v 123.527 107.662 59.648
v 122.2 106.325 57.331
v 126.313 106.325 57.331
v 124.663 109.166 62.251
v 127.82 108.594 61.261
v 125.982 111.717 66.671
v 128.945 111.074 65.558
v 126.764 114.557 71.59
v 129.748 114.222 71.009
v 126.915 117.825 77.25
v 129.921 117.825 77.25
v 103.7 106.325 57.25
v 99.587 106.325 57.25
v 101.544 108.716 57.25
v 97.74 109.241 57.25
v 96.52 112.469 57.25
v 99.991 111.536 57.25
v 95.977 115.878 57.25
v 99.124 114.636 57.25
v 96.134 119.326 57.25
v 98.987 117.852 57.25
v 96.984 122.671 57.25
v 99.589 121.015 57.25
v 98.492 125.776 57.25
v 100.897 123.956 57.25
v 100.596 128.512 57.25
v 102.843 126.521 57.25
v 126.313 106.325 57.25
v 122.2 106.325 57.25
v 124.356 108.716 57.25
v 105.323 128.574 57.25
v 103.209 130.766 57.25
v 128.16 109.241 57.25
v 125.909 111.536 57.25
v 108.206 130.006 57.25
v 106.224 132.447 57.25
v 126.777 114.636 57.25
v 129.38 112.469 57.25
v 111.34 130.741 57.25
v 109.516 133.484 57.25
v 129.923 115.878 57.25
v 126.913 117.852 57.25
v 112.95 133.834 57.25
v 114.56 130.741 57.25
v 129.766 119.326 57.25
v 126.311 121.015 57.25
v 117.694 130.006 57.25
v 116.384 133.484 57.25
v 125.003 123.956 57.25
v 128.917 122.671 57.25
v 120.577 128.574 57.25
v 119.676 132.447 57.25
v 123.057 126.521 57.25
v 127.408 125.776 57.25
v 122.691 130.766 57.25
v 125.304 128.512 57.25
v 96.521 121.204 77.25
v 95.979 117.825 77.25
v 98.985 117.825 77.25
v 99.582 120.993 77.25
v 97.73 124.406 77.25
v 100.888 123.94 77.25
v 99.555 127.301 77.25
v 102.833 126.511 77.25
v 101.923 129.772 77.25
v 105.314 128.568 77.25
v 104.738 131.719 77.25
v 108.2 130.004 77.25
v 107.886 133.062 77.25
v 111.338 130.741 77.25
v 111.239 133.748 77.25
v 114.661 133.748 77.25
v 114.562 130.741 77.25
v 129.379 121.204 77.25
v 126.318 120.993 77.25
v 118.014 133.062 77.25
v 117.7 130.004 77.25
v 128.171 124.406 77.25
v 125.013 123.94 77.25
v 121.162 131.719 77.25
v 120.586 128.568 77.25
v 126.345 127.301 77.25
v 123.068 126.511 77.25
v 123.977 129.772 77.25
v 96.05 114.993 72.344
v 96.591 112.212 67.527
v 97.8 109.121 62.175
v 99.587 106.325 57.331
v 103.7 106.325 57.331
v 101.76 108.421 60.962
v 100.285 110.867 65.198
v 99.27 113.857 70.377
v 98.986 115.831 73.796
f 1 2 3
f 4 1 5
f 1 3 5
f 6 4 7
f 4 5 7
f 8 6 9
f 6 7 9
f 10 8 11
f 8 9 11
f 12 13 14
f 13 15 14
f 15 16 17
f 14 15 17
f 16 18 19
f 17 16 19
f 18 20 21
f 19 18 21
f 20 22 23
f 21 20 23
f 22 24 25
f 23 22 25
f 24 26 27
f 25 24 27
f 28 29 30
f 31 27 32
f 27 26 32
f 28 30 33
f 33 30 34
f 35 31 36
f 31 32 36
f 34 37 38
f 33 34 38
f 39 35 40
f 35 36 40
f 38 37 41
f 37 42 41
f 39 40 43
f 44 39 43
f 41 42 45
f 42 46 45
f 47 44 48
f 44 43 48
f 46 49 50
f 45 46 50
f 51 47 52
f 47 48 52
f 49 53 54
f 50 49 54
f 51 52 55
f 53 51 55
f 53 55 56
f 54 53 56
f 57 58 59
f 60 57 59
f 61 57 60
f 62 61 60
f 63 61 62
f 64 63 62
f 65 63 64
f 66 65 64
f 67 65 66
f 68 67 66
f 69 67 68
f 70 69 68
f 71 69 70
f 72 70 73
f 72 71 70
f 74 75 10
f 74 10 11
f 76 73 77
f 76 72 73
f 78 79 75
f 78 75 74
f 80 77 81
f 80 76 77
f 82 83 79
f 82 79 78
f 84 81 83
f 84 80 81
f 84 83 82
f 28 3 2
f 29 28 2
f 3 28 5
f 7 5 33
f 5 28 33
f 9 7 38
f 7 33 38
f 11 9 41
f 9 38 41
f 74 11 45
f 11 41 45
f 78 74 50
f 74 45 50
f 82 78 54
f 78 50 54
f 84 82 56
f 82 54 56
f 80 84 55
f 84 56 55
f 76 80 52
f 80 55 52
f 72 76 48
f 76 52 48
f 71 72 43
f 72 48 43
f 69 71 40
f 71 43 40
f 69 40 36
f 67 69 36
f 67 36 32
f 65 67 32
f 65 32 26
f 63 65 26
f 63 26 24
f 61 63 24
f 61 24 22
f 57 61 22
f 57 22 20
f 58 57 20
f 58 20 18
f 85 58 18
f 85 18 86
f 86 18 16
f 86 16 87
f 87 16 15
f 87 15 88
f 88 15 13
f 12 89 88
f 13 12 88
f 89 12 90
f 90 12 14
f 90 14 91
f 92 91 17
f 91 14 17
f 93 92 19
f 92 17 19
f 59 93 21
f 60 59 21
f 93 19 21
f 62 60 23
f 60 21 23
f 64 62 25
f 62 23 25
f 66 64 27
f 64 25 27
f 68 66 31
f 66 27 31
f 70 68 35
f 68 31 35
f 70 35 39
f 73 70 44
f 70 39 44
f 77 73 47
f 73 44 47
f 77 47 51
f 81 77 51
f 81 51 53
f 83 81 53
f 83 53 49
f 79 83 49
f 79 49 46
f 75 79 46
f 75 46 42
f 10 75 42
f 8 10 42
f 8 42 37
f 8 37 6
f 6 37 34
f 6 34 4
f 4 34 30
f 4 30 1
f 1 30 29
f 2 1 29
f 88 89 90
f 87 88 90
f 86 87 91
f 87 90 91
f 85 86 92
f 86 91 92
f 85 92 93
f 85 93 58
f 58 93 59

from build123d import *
from OCP.BRepAlgoAPI import BRepAlgoAPI_Cut
from OCP.TopTools import TopTools_ListOfShape

# Parameters (mm, degrees)
BOSS_EXTRUDE1_DEPTH              = 5
SKETCH2_R                        = 2.5
BOSS_EXTRUDE2_DEPTH              = 100
SKETCH3_W                        = 5
SKETCH3_H                        = 5
BOSS_EXTRUDE3_DEPTH              = 10
SKETCH5_W                        = 5
SKETCH5_H                        = 4.330127019
BOSS_EXTRUDE4_DEPTH              = 117
SKETCH6_W                        = 5
SKETCH6_H                        = 5
BOSS_EXTRUDE5_DEPTH              = 20
BOSS_EXTRUDE6_DEPTH              = 15
SKETCH9_W                        = 5
SKETCH9_H                        = 5
BOSS_EXTRUDE7_DEPTH              = 10
SKETCH10_W                       = 5
SKETCH10_H                       = 5
BOSS_EXTRUDE8_DEPTH              = 99.159909
SKETCH11_W                       = 10
SKETCH11_H                       = 3
BOSS_EXTRUDE9_DEPTH              = 10
CUT_EXTRUDE1_DEPTH               = 187.084790711
CUT_EXTRUDE1_DEPTH_BACK          = 187.084790711
SKETCH13_R                       = 2
SKETCH14_W                       = 10
SKETCH14_H                       = 3
BOSS_EXTRUDE10_DEPTH             = 20
CUT_EXTRUDE2_DEPTH               = 194.255140511
CUT_EXTRUDE2_DEPTH_BACK          = 194.255140511
SKETCH15_R                       = 2
BOSS_EXTRUDE11_DEPTH             = 7.8
CUT_EXTRUDE3_DEPTH               = 187.016127587
CUT_EXTRUDE3_DEPTH_BACK          = 187.016127587
SKETCH17_W                       = 22.17902444
SKETCH17_H                       = 20
BOSS_EXTRUDE12_DEPTH             = 5.75
BOSS_EXTRUDE12_DEPTH_BACK        = 5
SKETCH19_W                       = 1.5
SKETCH19_H                       = 10.75
BOSS_EXTRUDE13_DEPTH             = 2.742414
SKETCH21_W                       = 1.5
SKETCH21_H                       = 1
BOSS_EXTRUDE15_DEPTH             = 1
BOSS_EXTRUDE17_REACH             = 195.512
CUT_EXTRUDE4_START               = 2
SKETCH23_W                       = 7.8
SKETCH23_H                       = 12
CUT_EXTRUDE4_DEPTH               = 10
BOSS_EXTRUDE19_DEPTH             = 5
BOSS_EXTRUDE19_DEPTH_BACK        = 2.165064
SKETCH23_2_W                     = 7.8
SKETCH23_2_H                     = 12
CUT_EXTRUDE5_DEPTH               = 1.25
BOSS_EXTRUDE20_REACH             = 188.016
SKETCH25_W                       = 5
SKETCH25_H                       = 4.330127019
SKETCH26_W                       = 5
SKETCH26_H                       = 2.16506351
CUT_EXTRUDE6_DEPTH               = 5
SKETCH27_W                       = 5.75
SKETCH27_H                       = 7.16506351
BOSS_EXTRUDE21_DEPTH             = 5
SKETCH29_W                       = 3
SKETCH29_H                       = 30
BOSS_EXTRUDE22_DEPTH             = 55
SKETCH30_W                       = 5
SKETCH30_H                       = 3
BOSS_EXTRUDE23_DEPTH             = 5
SKETCH31_W                       = 5
SKETCH31_H                       = 5
BOSS_EXTRUDE24_DEPTH             = 33.5
SKETCH32_W                       = 2
SKETCH32_H                       = 19
BOSS_EXTRUDE25_DEPTH             = 12
SKETCH34_W                       = 41
SKETCH34_H                       = 3
CUT_EXTRUDE7_DEPTH               = 30
SKETCH35_W                       = 14
SKETCH35_H                       = 12
BOSS_EXTRUDE26_DEPTH             = 7
BOSS_EXTRUDE27_REACH             = 187.154
SKETCH36_W                       = 9
SKETCH36_H                       = 5
BOSS_EXTRUDE27_DIRECTION_2_REACH = 187.154
SKETCH37_W                       = 41.5
SKETCH37_H                       = 5
BOSS_EXTRUDE28_DEPTH             = 41
SKETCH38_W                       = 34.251665069
SKETCH38_H                       = 27.087918127
CUT_EXTRUDE8_DEPTH               = 185.330721404
SKETCH39_W                       = 67.684653824
SKETCH39_H                       = 30.030202731
CUT_EXTRUDE9_DEPTH               = 190.235302527
SKETCH44_W                       = 5
SKETCH44_H                       = 7.16506351
BOSS_EXTRUDE30_DEPTH             = 18.612596
BOSS_EXTRUDE31_DEPTH             = 20
BOSS_EXTRUDE32_DEPTH             = 15
SKETCH46_W                       = 5
SKETCH46_H                       = 5
EDIT_THIS_LENGTH_DEPTH           = 50
SKETCH47_W                       = 5
SKETCH47_H                       = 3
BOSS_EXTRUDE34_DEPTH             = 5
CUT_EXTRUDE11_DEPTH              = 203.657530065
CUT_EXTRUDE11_DEPTH_BACK         = 203.657530065
SKETCH53_W                       = 268.348847746
SKETCH53_H                       = 124.858242806


with BuildPart() as part:
    # Sketch1 → Boss-Extrude1 (new body)
    with BuildSketch(Plane(origin=(0, 0, 0), x_dir=(1, 0, 0), z_dir=(0, 1, 0))):
        Polygon((121, 0), (0, 0), (0, -68), (5, -68), (5, -5), (116, -5), (116, -68), (121, -68), align=None)
    extrude(amount=BOSS_EXTRUDE1_DEPTH)

    # Sketch2 → Boss-Extrude2 (add)
    with BuildSketch(Plane(origin=(0, 3.75, 2.165063509), x_dir=(1, 0, 0), z_dir=(0, 0.866025403784438, 0.500000000000001))):
        with Locations(Location((118.200131686, -0.299868314, 0), (0, 0, 90))):
            Circle(SKETCH2_R)
    extrude(amount=BOSS_EXTRUDE2_DEPTH)

    # Sketch3 → Boss-Extrude3 (add)
    with BuildSketch(Plane(origin=(121, 0, 0), x_dir=(0, 0, -1), z_dir=(1, 0, 0))):
        with Locations((-2.5, 2.5)):
            Rectangle(SKETCH3_W, SKETCH3_H)
    extrude(amount=BOSS_EXTRUDE3_DEPTH)

    # Sketch5 → Boss-Extrude4 (add)
    with BuildSketch(Plane(origin=(0, 3.75, 2.165063509), x_dir=(1, 0, 0), z_dir=(0, 0.866025403784438, 0.500000000000001))):
        with Locations((128.5, 0.33493649)):
            Rectangle(SKETCH5_W, SKETCH5_H)
    extrude(amount=BOSS_EXTRUDE4_DEPTH)

    # Sketch6 → Boss-Extrude5 (add)
    with BuildSketch(Plane(origin=(0, 1.25, -2.165063509), x_dir=(-1, 0, 0), z_dir=(0, 0.5000000000000009, -0.866025403784438))):
        with Locations((-128.5, 118.830127019)):
            Rectangle(SKETCH6_W, SKETCH6_H)
    extrude(amount=BOSS_EXTRUDE5_DEPTH)

    # Sketch7 → Boss-Extrude6 (add)
    with BuildSketch(Plane.ZY.offset(-126)):
        Polygon((45.509618943, 113.824972243), (41.179491924, 116.324972243), (38.679491924, 111.994845224), (43.009618943, 109.494845224), align=None)
    extrude(amount=BOSS_EXTRUDE6_DEPTH)

    # Sketch9 → Boss-Extrude7 (add)
    with BuildSketch(Plane(origin=(121, 0, 0), x_dir=(0, 0, -1), z_dir=(1, 0, 0))):
        with Locations((-59.75, 2.5)):
            Rectangle(SKETCH9_W, SKETCH9_H)
    extrude(amount=BOSS_EXTRUDE7_DEPTH)

    # Sketch10 → Boss-Extrude8 (add)
    with BuildSketch(Plane(origin=(0, 5, 0), x_dir=(1, 0, 0), z_dir=(0, 1, 0))):
        with Locations((128.5, -59.75)):
            Rectangle(SKETCH10_W, SKETCH10_H)
    extrude(amount=BOSS_EXTRUDE8_DEPTH)

    # Sketch11 → Boss-Extrude9 (add)
    with BuildSketch(Plane.ZY):
        with Locations((57.25, 1.5)):
            Rectangle(SKETCH11_W, SKETCH11_H)
        with Locations((5, 1.5)):
            Rectangle(SKETCH11_W, SKETCH11_H)
    extrude(amount=BOSS_EXTRUDE9_DEPTH)

    # Sketch13 → Cut-Extrude1 (cut, two sides: drawn at the far end of the back side and taken through both)
    with BuildSketch(Plane(origin=(0, 3, 0), x_dir=(1, 0, 0), z_dir=(0, 1, 0)).offset(-CUT_EXTRUDE1_DEPTH_BACK)):
        with Locations(Location((-5, -5, 0), (0, 0, 270))):
            Circle(SKETCH13_R)
        with Locations(Location((-5, -57.25, 0), (0, 0, 270))):
            Circle(SKETCH13_R)
    extrude(amount=CUT_EXTRUDE1_DEPTH + CUT_EXTRUDE1_DEPTH_BACK, mode=Mode.SUBTRACT)

    # Sketch14 → Boss-Extrude10 (add)
    with BuildSketch(Plane(origin=(121, 0, 0), x_dir=(0, 0, -1), z_dir=(1, 0, 0))):
        with Locations((-15, 1.5)):
            Rectangle(SKETCH14_W, SKETCH14_H)
        with Locations((-47.25, 1.5)):
            Rectangle(SKETCH14_W, SKETCH14_H)
    extrude(amount=BOSS_EXTRUDE10_DEPTH)

    # Sketch15 → Cut-Extrude2 (cut, two sides: drawn at the far end of the back side and taken through both)
    with BuildSketch(Plane(origin=(0, 3, 0), x_dir=(1, 0, 0), z_dir=(0, 1, 0)).offset(-CUT_EXTRUDE2_DEPTH_BACK)):
        with Locations(Location((136, -15, 0), (0, 0, 270))):
            Circle(SKETCH15_R)
        with Locations(Location((136, -47.25, 0), (0, 0, 270))):
            Circle(SKETCH15_R)
    extrude(amount=CUT_EXTRUDE2_DEPTH + CUT_EXTRUDE2_DEPTH_BACK, mode=Mode.SUBTRACT)

    # Sketch16 → Boss-Extrude11 (add)
    with BuildSketch(Plane.ZY.offset(-126)):
        Polygon((49.839745962, 111.324972243), (67, 101.417494955), (64.5, 97.087367936), (47.339745962, 106.994845224), align=None)
    extrude(amount=BOSS_EXTRUDE11_DEPTH)

    # Sketch17 → Cut-Extrude3 (cut, two sides: drawn at the far end of the back side and taken through both)
    with BuildSketch(Plane(origin=(0, 105.074972243, 60.665063509), x_dir=(1, 0, 0), z_dir=(0, 0.8660254037844382, 0.500000000000001)).offset(-CUT_EXTRUDE3_DEPTH_BACK)):
        with Locations((119.91048778, 12.5)):
            Rectangle(SKETCH17_W, SKETCH17_H)
    extrude(amount=CUT_EXTRUDE3_DEPTH + CUT_EXTRUDE3_DEPTH_BACK, mode=Mode.SUBTRACT)



with BuildPart() as body_2:
    # Sketch18 → Boss-Extrude12 (new, two sides: drawn at the far end of the back side and taken through both)
    with BuildSketch(Plane.XY.offset(62.25).offset(-BOSS_EXTRUDE12_DEPTH_BACK)):
        with BuildLine():
            Line((118.2, 104.159908733), (119.7, 104.159908733))
            ThreePointArc((119.7, 104.159908733), (110.2, 113.659908733), (100.7, 104.159908733))
            Line((100.7, 104.159908733), (102.2, 104.159908733))
            ThreePointArc((102.2, 104.159908733), (110.2, 112.159908733), (118.2, 104.159908733))
        make_face()
    extrude(amount=BOSS_EXTRUDE12_DEPTH + BOSS_EXTRUDE12_DEPTH_BACK)


with BuildPart() as part_1:
    add(part.part)

    add(body_2.part)  # Boss-Extrude13 merges body 2
    # Sketch19 → Boss-Extrude13 (add)
    with BuildSketch(Plane.XZ.offset(-104.159908733)):
        with Locations((118.95, 62.625)):
            Rectangle(SKETCH19_W, SKETCH19_H)
    extrude(amount=BOSS_EXTRUDE13_DEPTH)

    # Sketch21 → Boss-Extrude15 (add)
    with BuildSketch(Plane.XZ.offset(-101.417494955)):
        with Locations((118.95, 67.5)):
            Rectangle(SKETCH21_W, SKETCH21_H)
    extrude(amount=BOSS_EXTRUDE15_DEPTH)

    # Boss-Extrude17: up to this plane
    boss_extrude17_end = Plane(origin=(119.7, 101.417494955, 68), z_dir=(0, 0, -1))
    # Sketch20 → Boss-Extrude17 (add, up to the surface)
    with BuildSketch(Plane(origin=(0, -3.657477288, 6.334936491), x_dir=(1, 0, 0), z_dir=(0, -0.5000000000000039, 0.8660254037844365)), mode=Mode.PRIVATE) as boss_extrude17_sk1:
        Polygon((126, 116.330127019), (126, 121.330127019), (119.7, 121.330127019), (118.2, 121.330127019), (118.2, 116.330127019), align=None)
    boss_extrude17_tool1 = split(extrude(boss_extrude17_sk1.sketch, amount=BOSS_EXTRUDE17_REACH, mode=Mode.PRIVATE), bisect_by=boss_extrude17_end, keep=Keep.BOTH, mode=Mode.PRIVATE)
    add(boss_extrude17_tool1.solids().sort_by_distance((122.1, 99.252431, 65.75))[0])

    # Sketch23 → Cut-Extrude4 (cut)
    with BuildSketch(Plane(origin=(0, 104.159908733, 0), x_dir=(-1, 0, 0), z_dir=(0, -1, 0)).offset(CUT_EXTRUDE4_START)):
        with Locations((-122.1, -62)):
            Rectangle(SKETCH23_W, SKETCH23_H)
    extrude(amount=CUT_EXTRUDE4_DEPTH, mode=Mode.SUBTRACT)

    # Sketch23<2> → Boss-Extrude19 (add, two sides: drawn at the far end of the back side and taken through both)
    with BuildSketch(Plane(origin=(0, 104.159908733, 0), x_dir=(-1, 0, 0), z_dir=(0, -1, 0)).offset(-BOSS_EXTRUDE19_DEPTH_BACK)):
        with Locations((-122.1, -62)):
            Rectangle(SKETCH23_2_W, SKETCH23_2_H)
    extrude(amount=BOSS_EXTRUDE19_DEPTH + BOSS_EXTRUDE19_DEPTH_BACK)


with BuildPart() as cut_extrude5_tool:
    # Sketch24 → Cut-Extrude5 (new body)
    with BuildSketch(Plane(origin=(0, 0, 56), x_dir=(-1, 0, 0), z_dir=(0, 0, -1))):
        Polygon((-126, 106.324972243), (-126, 101.994845224), (-126, 99.159908733), (-118.2, 99.159908733), (-118.2, 106.324972243), align=None)
    extrude(amount=-CUT_EXTRUDE5_DEPTH)


with BuildPart() as part_2:
    add(part_1.part)

    # Cut-Extrude5: cut by cut_extrude5_tool, with a tolerance
    cut_extrude5_stock = TopTools_ListOfShape()
    cut_extrude5_stock.Append(part_2.part.wrapped)
    cut_extrude5_tools = TopTools_ListOfShape()
    cut_extrude5_tools.Append(cut_extrude5_tool.part.wrapped)
    cut_extrude5_cut = BRepAlgoAPI_Cut()
    cut_extrude5_cut.SetArguments(cut_extrude5_stock)
    cut_extrude5_cut.SetTools(cut_extrude5_tools)
    cut_extrude5_cut.SetFuzzyValue(0.00001)
    cut_extrude5_cut.Build()
    add(Compound.cast(cut_extrude5_cut.Shape()).solids(), mode=Mode.REPLACE)

    # Boss-Extrude20: up to this face of the body (flat: up to its plane)
    boss_extrude20_end = Plane(part_2.part.faces().sort_by_distance((122.724999943, 106.324972733, 62.625))[0])
    # Sketch25 → Boss-Extrude20 (add, up to the picked face)
    with BuildSketch(Plane(origin=(0, 105.074972243, 60.665063509), x_dir=(1, 0, 0), z_dir=(0, 0.8660254037844382, 0.500000000000001)), mode=Mode.PRIVATE) as boss_extrude20_sk1:
        with Locations((128.5, 0.33493649)):
            Rectangle(SKETCH25_W, SKETCH25_H)
    boss_extrude20_tool1 = split(extrude(boss_extrude20_sk1.sketch, amount=BOSS_EXTRUDE20_REACH, mode=Mode.PRIVATE), bisect_by=boss_extrude20_end, keep=Keep.BOTH, mode=Mode.PRIVATE)
    add(boss_extrude20_tool1.solids().sort_by(Axis((128.5, 105.24244, 60.375), (0, 0.8660254037844382, 0.500000000000001)))[0])


with BuildPart() as cut_extrude6_tool:
    # Sketch26 → Cut-Extrude6 (new body)
    with BuildSketch(Plane.XY.offset(62.25)):
        with Locations((128.5, 105.242440488)):
            Rectangle(SKETCH26_W, SKETCH26_H)
    extrude(amount=CUT_EXTRUDE6_DEPTH)


with BuildPart() as part_3:
    add(part_2.part)

    # Cut-Extrude6: cut by cut_extrude6_tool, with a tolerance
    cut_extrude6_stock = TopTools_ListOfShape()
    cut_extrude6_stock.Append(part_3.part.wrapped)
    cut_extrude6_tools = TopTools_ListOfShape()
    cut_extrude6_tools.Append(cut_extrude6_tool.part.wrapped)
    cut_extrude6_cut = BRepAlgoAPI_Cut()
    cut_extrude6_cut.SetArguments(cut_extrude6_stock)
    cut_extrude6_cut.SetTools(cut_extrude6_tools)
    cut_extrude6_cut.SetFuzzyValue(0.00001)
    cut_extrude6_cut.Build()
    add(Compound.cast(cut_extrude6_cut.Shape()).solids(), mode=Mode.REPLACE)

    # Sketch27 → Boss-Extrude21 (add)
    with BuildSketch(Plane(origin=(126, 0, 0), x_dir=(0, 0, -1), z_dir=(1, 0, 0))):
        with Locations((-65.125, 102.742440488)):
            Rectangle(SKETCH27_W, SKETCH27_H)
    extrude(amount=BOSS_EXTRUDE21_DEPTH)

    # Sketch29 → Boss-Extrude22 (add)
    with BuildSketch(Plane.ZY):
        with Locations((40, 20)):
            Rectangle(SKETCH29_W, SKETCH29_H)
    extrude(amount=-BOSS_EXTRUDE22_DEPTH)

    # Sketch30 → Boss-Extrude23 (add)
    with BuildSketch(Plane.XZ.offset(-5)):
        with Locations((52.5, 40)):
            Rectangle(SKETCH30_W, SKETCH30_H)
    extrude(amount=BOSS_EXTRUDE23_DEPTH)

    # Sketch31 → Boss-Extrude24 (add)
    with BuildSketch(Plane(origin=(0, 0, 38.5), x_dir=(-1, 0, 0), z_dir=(0, 0, -1))):
        with Locations((-52.5, 2.5)):
            Rectangle(SKETCH31_W, SKETCH31_H)
    extrude(amount=BOSS_EXTRUDE24_DEPTH)

    # Sketch32 → Boss-Extrude25 (add)
    with BuildSketch(Plane(origin=(0, 0, 38.5), x_dir=(-1, 0, 0), z_dir=(0, 0, -1))):
        Polygon((-41, 9), (-53, 9), (-53, 35), (-55, 35), (-55, 7), (-41, 7), align=None)
        with Locations((-42, 25.5)):
            Rectangle(SKETCH32_W, SKETCH32_H)
    extrude(amount=BOSS_EXTRUDE25_DEPTH)

    # Sketch34 → Cut-Extrude7 (cut)
    with BuildSketch(Plane(origin=(0, 35, 0), x_dir=(1, 0, 0), z_dir=(0, 1, 0))):
        with Locations((20.5, -40)):
            Rectangle(SKETCH34_W, SKETCH34_H)
    extrude(amount=-CUT_EXTRUDE7_DEPTH, mode=Mode.SUBTRACT)

    # Sketch35 → Boss-Extrude26 (add)
    with BuildSketch(Plane.XZ.offset(-7)):
        with Locations((48, 32.5)):
            Rectangle(SKETCH35_W, SKETCH35_H)
    extrude(amount=BOSS_EXTRUDE26_DEPTH)

    # Boss-Extrude27: up to this face of the body (flat: up to its plane)
    boss_extrude27_end = Plane(part_3.part.faces().sort_by_distance((48.252808989, 19.016853933, 41.5))[0])
    # Sketch36 → Boss-Extrude27 (add, up to the picked face)
    with BuildSketch(Plane.XY.offset(38.5), mode=Mode.PRIVATE) as boss_extrude27_sk1:
        with Locations((45.5, 2.5)):
            Rectangle(SKETCH36_W, SKETCH36_H)
    boss_extrude27_tool1 = split(extrude(boss_extrude27_sk1.sketch, amount=BOSS_EXTRUDE27_REACH, mode=Mode.PRIVATE), bisect_by=boss_extrude27_end, keep=Keep.BOTH, mode=Mode.PRIVATE)
    add(boss_extrude27_tool1.solids().sort_by(Axis((45.5, 2.5, 38.5), (0, 0, 1)))[0])

    # Boss-Extrude27 direction 2: up to this face of the body (flat: up to its plane)
    boss_extrude27_direction_2_end = Plane(part_3.part.faces().sort_by_distance((27.5, 2.5, 5))[0])
    # Sketch36 → Boss-Extrude27 direction 2 (add, up to the picked face)
    with BuildSketch(Plane.XY.offset(38.5), mode=Mode.PRIVATE) as boss_extrude27_direction_2_sk1:
        with Locations((45.5, 2.5)):
            Rectangle(SKETCH36_W, SKETCH36_H)
    boss_extrude27_direction_2_tool1 = split(extrude(boss_extrude27_direction_2_sk1.sketch, amount=-BOSS_EXTRUDE27_DIRECTION_2_REACH, mode=Mode.PRIVATE), bisect_by=boss_extrude27_direction_2_end, keep=Keep.BOTH, mode=Mode.PRIVATE)
    add(boss_extrude27_direction_2_tool1.solids().sort_by(Axis((45.5, 2.5, 38.5), (0, 0, -1)))[0])

    # Sketch37 → Boss-Extrude28 (add)
    with BuildSketch(Plane.ZY.offset(-41)):
        with Locations((20.75, 2.5)):
            Rectangle(SKETCH37_W, SKETCH37_H)
    extrude(amount=BOSS_EXTRUDE28_DEPTH)

    # Sketch38 → Cut-Extrude8 (cut, through all)
    with BuildSketch(Plane.ZY.offset(-118.2)):
        with Locations((61.183105348, 109.662346151)):
            Rectangle(SKETCH38_W, SKETCH38_H)
    extrude(amount=CUT_EXTRUDE8_DEPTH, mode=Mode.SUBTRACT)

    # Sketch39 → Cut-Extrude9 (cut, through all)
    with BuildSketch(Plane(origin=(0, 106.324972243, 0), x_dir=(1, 0, 0), z_dir=(0, 1, 0))):
        with Locations((120.498501698, -57.225220953)):
            Rectangle(SKETCH39_W, SKETCH39_H)
    extrude(amount=CUT_EXTRUDE9_DEPTH, mode=Mode.SUBTRACT)

    # Sketch44 → Boss-Extrude30 (add)
    with BuildSketch(Plane.ZY.offset(-118.2)):
        with Locations((59.75, 102.742440488)):
            Rectangle(SKETCH44_W, SKETCH44_H)
    extrude(amount=BOSS_EXTRUDE30_DEPTH)

    # Sketch43 → Boss-Extrude31 (add)
    with BuildSketch(Plane(origin=(0, 0, 57.25), x_dir=(-1, 0, 0), z_dir=(0, 0, -1))):
        with BuildLine():
            Line((-122.200131686, 106.324972243), (-126, 106.324972243))
            Line((-126, 106.324972243), (-126.312859701, 106.324972243))
            ThreePointArc((-126.312859701, 106.324972243), (-112.950131686, 133.833897021), (-99.587403671, 106.324972243))
            Line((-99.587403671, 106.324972243), (-103.700131686, 106.324972243))
            ThreePointArc((-103.700131686, 106.324972243), (-112.950131686, 130.833897021), (-122.200131686, 106.324972243))
        make_face()
    extrude(amount=-BOSS_EXTRUDE31_DEPTH)

    # Sketch45 → Boss-Extrude32 (add)
    with BuildSketch(Plane.XY.offset(62.25)):
        Polygon((118.2, 99.159908733), (118.2, 106.324972243), (103.700131686, 106.324972243), (99.587403671, 106.324972243), (99.587403671, 99.159908733), align=None)
    extrude(amount=BOSS_EXTRUDE32_DEPTH)

    # Sketch46 → EDIT THIS LENGTH (add)
    with BuildSketch(Plane.XY.offset(62.25)):
        with Locations((128.5, 86.659908733)):
            Rectangle(SKETCH46_W, SKETCH46_H)
    extrude(amount=EDIT_THIS_LENGTH_DEPTH)

    # Sketch47 → Boss-Extrude34 (add)
    with BuildSketch(Plane(origin=(0, 89.159908733, 0), x_dir=(1, 0, 0), z_dir=(0, 1, 0))):
        with Locations((128.5, -110.75)):
            Rectangle(SKETCH47_W, SKETCH47_H)
    extrude(amount=BOSS_EXTRUDE34_DEPTH)

    # Sketch53 → Cut-Extrude11 (cut, two sides: drawn at the far end of the back side and taken through both)
    with BuildSketch(Plane(origin=(0, 0, 57.25), x_dir=(-1, 0, 0), z_dir=(0, 0, -1)).offset(-CUT_EXTRUDE11_DEPTH_BACK)):
        with Locations((-70.998175197, 43.89585084)):
            Rectangle(SKETCH53_W, SKETCH53_H)
    extrude(amount=CUT_EXTRUDE11_DEPTH + CUT_EXTRUDE11_DEPTH_BACK, mode=Mode.SUBTRACT)


with BuildPart() as cut_extrude11_kept_piece:
    # of the separate pieces the step leaves, the one the design keeps (cut_extrude11_pieces_kept)
    add(part_3.part.solids().sort_by_distance((126.312859701, 106.324972243, 57.25))[0])

    # Chamfer1
    # the kernel refuses this chamfer: 19.918584287, 11.5 mm, written as the material it takes off along each edge
    with BuildSketch(Plane(origin=(177.843945363, 106.324972243, 77.25), x_dir=(0, 0, -1), z_dir=(-1, 0, 0)), Plane(origin=(155.231217348, 106.324972243, 77.25), x_dir=(0, 0, -1), z_dir=(-1, 0, 0))) as chamfer1_piece_1:
        with BuildLine():
            Line((20.608584287, 0.398371686), (-0.69, -11.898371686))
            Line((-0.69, -11.898371686), (-1.088371686, -11.898371686))
            ThreePointArc((-1.088371686, -11.898371686), (-0.398371686, -5.949185843), (-0.398371686, 0))
            Line((-0.398371686, 0), (0, 0.398371686))
            ThreePointArc((0, 0.398371686), (10.304292144, 0.398371686), (20.608584287, 0.796743371))
            Line((20.608584287, 0.796743371), (20.608584287, 0.398371686))
        make_face()
    extrude(amount=107.174899338, mode=Mode.SUBTRACT)


solid = cut_extrude11_kept_piece.part
